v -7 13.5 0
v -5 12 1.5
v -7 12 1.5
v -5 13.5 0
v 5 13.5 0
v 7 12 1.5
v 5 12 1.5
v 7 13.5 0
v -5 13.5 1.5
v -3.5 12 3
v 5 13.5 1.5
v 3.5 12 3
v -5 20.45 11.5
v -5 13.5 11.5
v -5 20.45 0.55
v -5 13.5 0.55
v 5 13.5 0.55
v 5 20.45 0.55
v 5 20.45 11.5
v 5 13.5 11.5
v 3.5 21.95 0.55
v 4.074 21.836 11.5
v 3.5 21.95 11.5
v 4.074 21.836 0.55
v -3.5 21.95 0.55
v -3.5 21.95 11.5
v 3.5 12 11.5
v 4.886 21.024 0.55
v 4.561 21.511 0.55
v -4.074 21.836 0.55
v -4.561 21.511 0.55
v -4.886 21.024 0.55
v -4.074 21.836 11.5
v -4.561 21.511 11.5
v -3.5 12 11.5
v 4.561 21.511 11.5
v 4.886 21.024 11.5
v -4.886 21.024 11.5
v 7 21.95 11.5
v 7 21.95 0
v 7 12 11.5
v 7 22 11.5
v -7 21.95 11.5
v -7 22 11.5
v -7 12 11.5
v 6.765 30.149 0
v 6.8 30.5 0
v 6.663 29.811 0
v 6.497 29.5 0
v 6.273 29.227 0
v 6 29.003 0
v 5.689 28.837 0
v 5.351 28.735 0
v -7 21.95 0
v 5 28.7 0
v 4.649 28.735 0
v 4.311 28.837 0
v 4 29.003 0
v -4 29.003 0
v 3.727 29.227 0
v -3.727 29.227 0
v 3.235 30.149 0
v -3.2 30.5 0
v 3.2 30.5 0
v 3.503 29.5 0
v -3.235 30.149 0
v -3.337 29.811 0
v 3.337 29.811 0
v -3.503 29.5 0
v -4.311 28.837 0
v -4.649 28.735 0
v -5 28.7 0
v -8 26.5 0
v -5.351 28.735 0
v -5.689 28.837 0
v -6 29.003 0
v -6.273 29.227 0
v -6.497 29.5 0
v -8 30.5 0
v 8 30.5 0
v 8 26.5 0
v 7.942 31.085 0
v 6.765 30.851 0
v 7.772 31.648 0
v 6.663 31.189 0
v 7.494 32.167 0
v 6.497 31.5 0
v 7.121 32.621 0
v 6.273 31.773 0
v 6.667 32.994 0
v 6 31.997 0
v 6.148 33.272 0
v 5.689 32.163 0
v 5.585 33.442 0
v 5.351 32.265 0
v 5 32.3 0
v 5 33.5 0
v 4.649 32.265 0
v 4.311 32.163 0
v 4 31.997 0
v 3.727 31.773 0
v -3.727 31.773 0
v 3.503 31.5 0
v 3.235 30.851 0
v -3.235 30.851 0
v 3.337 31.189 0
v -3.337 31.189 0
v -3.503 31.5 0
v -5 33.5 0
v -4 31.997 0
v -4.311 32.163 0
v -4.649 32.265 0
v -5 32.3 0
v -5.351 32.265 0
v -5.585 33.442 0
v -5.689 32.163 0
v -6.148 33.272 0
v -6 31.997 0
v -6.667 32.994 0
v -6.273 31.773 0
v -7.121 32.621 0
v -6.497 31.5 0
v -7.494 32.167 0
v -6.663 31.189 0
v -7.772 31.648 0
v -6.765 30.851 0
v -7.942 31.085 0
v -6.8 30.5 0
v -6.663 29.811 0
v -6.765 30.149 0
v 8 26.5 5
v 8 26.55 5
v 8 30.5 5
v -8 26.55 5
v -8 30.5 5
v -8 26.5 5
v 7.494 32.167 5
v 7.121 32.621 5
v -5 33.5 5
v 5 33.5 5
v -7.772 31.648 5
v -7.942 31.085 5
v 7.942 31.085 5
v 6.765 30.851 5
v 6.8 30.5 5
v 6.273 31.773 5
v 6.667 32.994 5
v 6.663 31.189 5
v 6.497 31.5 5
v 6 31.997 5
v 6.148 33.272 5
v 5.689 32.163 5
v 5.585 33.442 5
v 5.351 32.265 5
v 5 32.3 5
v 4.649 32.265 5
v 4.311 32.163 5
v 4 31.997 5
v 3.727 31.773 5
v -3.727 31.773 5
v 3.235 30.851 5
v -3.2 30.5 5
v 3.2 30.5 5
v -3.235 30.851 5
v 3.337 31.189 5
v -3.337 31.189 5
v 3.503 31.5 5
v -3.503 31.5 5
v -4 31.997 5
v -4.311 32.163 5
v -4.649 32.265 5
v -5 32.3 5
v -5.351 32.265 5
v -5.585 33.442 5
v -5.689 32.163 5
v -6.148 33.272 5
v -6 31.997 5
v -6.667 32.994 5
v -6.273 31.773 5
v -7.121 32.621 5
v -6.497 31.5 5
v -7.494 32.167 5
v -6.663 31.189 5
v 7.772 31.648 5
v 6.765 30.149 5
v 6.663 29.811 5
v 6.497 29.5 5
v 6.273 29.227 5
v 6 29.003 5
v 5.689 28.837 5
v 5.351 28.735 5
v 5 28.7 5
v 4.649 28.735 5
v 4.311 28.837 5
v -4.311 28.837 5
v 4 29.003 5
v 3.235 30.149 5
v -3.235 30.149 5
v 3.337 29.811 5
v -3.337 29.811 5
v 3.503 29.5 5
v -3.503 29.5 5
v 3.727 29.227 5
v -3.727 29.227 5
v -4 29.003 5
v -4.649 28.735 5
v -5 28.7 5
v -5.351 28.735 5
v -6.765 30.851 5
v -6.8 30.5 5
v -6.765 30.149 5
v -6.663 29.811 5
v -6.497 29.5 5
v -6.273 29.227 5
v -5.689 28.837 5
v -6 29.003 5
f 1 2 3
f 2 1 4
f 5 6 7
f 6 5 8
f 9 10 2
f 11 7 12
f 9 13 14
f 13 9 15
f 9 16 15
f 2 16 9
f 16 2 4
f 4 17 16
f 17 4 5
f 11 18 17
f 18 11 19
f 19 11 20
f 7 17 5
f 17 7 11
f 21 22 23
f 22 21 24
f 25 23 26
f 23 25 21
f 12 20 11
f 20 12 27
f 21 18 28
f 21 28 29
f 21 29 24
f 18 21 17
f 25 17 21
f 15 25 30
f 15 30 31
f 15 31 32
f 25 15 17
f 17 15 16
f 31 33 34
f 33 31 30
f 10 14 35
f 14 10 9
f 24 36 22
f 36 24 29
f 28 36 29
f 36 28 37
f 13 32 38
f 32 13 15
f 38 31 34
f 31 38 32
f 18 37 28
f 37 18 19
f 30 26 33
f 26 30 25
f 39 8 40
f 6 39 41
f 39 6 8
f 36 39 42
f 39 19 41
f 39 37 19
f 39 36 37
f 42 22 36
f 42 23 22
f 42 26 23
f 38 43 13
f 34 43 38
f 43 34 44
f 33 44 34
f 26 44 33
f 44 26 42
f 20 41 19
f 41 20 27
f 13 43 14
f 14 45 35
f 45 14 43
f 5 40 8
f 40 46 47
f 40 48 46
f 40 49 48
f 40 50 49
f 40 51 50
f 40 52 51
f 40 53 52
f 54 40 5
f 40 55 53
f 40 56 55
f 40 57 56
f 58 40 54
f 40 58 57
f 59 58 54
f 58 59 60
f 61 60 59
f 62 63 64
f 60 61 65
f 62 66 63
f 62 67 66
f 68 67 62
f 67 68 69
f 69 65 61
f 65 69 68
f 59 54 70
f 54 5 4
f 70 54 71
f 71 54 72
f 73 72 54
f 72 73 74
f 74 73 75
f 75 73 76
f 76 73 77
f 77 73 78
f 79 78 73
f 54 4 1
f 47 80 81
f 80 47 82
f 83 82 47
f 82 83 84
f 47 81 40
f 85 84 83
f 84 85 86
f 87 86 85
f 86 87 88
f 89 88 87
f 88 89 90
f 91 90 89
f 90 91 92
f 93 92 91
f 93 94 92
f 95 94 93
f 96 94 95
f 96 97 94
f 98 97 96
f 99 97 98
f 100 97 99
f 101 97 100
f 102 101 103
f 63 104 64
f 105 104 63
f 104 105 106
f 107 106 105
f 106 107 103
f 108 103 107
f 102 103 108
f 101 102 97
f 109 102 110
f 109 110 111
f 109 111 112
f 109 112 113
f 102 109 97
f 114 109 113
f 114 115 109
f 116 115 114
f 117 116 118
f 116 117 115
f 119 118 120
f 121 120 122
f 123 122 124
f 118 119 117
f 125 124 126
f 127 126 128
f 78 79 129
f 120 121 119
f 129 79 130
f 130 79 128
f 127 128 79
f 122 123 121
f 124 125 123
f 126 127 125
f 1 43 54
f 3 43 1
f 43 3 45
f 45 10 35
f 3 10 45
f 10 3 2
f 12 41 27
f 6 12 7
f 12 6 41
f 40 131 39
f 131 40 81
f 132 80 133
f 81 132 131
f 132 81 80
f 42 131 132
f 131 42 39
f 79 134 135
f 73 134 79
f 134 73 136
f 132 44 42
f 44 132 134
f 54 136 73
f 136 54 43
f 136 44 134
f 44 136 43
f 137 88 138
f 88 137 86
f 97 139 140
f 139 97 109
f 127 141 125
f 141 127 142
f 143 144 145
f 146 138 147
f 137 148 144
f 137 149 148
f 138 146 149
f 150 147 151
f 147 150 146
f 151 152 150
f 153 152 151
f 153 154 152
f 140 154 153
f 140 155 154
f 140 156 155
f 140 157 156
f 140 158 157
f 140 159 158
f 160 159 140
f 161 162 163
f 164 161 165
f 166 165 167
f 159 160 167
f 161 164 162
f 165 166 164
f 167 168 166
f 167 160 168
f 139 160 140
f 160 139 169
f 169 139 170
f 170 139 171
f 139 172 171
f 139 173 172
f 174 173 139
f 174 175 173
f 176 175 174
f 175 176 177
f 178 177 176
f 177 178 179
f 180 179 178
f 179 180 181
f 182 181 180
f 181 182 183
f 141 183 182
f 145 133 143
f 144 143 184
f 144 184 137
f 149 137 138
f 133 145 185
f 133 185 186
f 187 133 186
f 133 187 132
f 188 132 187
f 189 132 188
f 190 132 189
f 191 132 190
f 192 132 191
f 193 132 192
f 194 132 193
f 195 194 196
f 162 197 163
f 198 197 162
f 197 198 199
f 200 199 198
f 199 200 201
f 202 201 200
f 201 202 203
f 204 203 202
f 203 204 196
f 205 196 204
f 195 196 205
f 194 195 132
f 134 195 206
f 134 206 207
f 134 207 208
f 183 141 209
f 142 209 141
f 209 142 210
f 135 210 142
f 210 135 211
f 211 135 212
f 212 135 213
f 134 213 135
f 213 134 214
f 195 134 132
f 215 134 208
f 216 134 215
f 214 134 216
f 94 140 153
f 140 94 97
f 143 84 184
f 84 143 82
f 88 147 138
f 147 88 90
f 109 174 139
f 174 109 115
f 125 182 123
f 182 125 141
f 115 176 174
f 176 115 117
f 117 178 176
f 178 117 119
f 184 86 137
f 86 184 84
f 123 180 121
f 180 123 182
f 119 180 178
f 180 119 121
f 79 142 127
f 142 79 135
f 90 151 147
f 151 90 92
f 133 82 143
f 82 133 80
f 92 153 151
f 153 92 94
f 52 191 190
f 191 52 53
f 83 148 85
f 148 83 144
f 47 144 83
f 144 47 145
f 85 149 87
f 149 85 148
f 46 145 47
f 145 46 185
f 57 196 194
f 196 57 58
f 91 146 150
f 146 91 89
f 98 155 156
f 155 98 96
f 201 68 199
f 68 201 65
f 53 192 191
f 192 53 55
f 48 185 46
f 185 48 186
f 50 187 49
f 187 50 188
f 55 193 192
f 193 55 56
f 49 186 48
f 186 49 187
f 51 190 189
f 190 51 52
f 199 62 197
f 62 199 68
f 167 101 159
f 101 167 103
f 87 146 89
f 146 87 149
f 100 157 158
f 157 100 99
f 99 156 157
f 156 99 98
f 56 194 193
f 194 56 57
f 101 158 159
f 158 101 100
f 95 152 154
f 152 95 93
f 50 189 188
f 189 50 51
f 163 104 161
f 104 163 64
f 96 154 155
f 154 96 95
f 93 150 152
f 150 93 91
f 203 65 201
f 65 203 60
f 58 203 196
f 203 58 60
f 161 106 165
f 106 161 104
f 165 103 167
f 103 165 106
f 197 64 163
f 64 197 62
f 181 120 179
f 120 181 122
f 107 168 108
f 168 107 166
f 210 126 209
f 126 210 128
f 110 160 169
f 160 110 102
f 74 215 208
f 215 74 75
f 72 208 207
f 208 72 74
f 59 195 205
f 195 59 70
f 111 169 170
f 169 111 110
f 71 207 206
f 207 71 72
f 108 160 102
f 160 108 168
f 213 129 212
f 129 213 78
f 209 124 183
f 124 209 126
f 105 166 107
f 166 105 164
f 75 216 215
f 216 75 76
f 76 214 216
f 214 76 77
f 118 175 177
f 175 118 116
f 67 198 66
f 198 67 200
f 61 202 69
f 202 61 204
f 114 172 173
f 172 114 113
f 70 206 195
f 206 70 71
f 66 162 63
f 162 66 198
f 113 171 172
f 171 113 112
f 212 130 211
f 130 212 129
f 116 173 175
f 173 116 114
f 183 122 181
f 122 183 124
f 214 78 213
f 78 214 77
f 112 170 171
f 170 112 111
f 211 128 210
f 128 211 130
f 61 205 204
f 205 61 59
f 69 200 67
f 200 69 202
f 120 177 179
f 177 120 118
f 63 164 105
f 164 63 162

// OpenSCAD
// file: microscope_parameters.scad
/******************************************************************
*                                                                 *
* OpenFlexure Microscope: Microscope Parameters                   *
*                                                                 *
* This is the top-level configuration file for the OpenFlexure    *
* microscope, an open microscope and 3-axis translation stage.    *
* It gets really good precision over a ~10mm range, by using      *
* plastic flexure mechanisms.                                     *
*                                                                 *
* Generally I've tried to put parts (or collections of closely    *
* related parts) in their own files.  However, all the parts      *
* depend on the geometry of the microscope - so these parameters  *
* are gathered together here.  In general, the ones you might     *
* to change are towards the top!  Lower-down ones are defined in  *
* terms of higher-up ones - confusion might arise if you redefine *
* these later...                                                  *
*                                                                 *
* (c) Richard Bowman, January 2016                                *
* Released under the CERN Open Hardware License                   *
*                                                                 *
* http://www.github.com/rwb27/openflexure_microscope              *
* http://www.docubricks.com/projects/openflexure-microscope       *
* http://www.waterscope.org                                       *
*                                                                 *
******************************************************************/

d = 0.05;
$fn=32;

// These are the most useful parameters to change!
big_stage = true;
motor_lugs = true;
version_numstring = "5.15.2";

// This sets the basic geometry of the microscope
sample_z = big_stage?65:40; // height of the top of the stage
leg_r = big_stage?30:25; // radius of innermost part of legs
hole_r = big_stage?15:10; // size of hole in the stage
xy_lever_ratio = big_stage?4.0/7.0:1.0; // mechanical advantage of actuator over stage - can be used to trade speed and precision
z_lever_ratio = big_stage?2.4:2.6; // as above, for Z axis (must be >1)
// The variables below affect the position of the objective mount
z_strut_l = big_stage?20:15; //length of struts supporting Z carriage
objective_clip_y = big_stage?12:6; // y position of clip for optics
objective_clip_w = 10; // width of the dovetail clip for the optics
foot_height = 15; //height of the feet (distance from bottom of body to table)

// These variables set the dimensions of flexures
// You might want to tweak them if your material (or printer)
// is different from the ones I've tested, though ABS/PLA extrusion
// is generally fine with my parameters
stage_flex_w = 4; // width of XY axis flexures
zflex_l = 1.5;    // length of (all) flexible bits
zflex_t = 0.75;   // thickness of (all) flexible bits

// Compile a sensible version string
version_string = str("v",version_numstring, big_stage?str("-LS",sample_z):"", motor_lugs?"-M":"");
echo("Compiling OpenFlexure Microscope ",version_string);

stage_t=5; //thickness of the XY stage (at thickest point, most is 1mm less)
flex_z1 = 0;      // z position of lower flexures for XY axis
flex_z2 = sample_z-stage_t; //height of upper XY flexures
z_strut_t = 6;  // (z) thickness of struts for Z axis
z_flex_w = 4;   // width of struts for Z axis
leg = [4,stage_flex_w,flex_z2+zflex_t]; // size of vertical legs
leg_middle_w = 12; // width of the middle part of each leg

leg_outer_w = leg_middle_w + 2*zflex_l + 2*leg[0]; // overall width of parallelogram legs that support the stagef
actuator = [6,(flex_z2 - flex_z1)*xy_lever_ratio,6]; // dimensions of the core part of the actuating levers for X and Y
actuating_nut_r = (flex_z2 - flex_z1)*xy_lever_ratio; // distance from leg_r to the actuating nut/screw for the XY axes
xy_actuator_travel = actuating_nut_r*0.15; // distance moved by XY axis actuators
z_flexure_x = (leg_r-zflex_l-max(5,leg[2]*0.1))*sqrt(2); // x position of the outside of the Z-axis static anchors (either side of the XY stage, on the X axis)
z_flexure_spacing = min(flex_z2-actuator[2]-z_strut_l*0.22-2, 30); // distance between the two sets of flexures on the Z axis
z_carriage = [(z_flexure_x-zflex_l*2-z_strut_l)+d,4,z_flexure_spacing+zflex_t]; //size of the moving block for the Z carriage
z_nut_y = (z_strut_l+zflex_l)*z_lever_ratio+zflex_l/2; // position of Z actuator
z_actuator_travel = z_nut_y*0.15; // distance moved by the Z actuator
z_carriage_y = z_strut_l+2*zflex_l; // y position of moving pivot on Z axis
z_link_w = 4; // width of linking bar between top Z-axis flexure struts
bridge_dz = 10; // spacing between thin links on legs
base_t=1; // thickness of the flat base of the structure
wall_h=15; // height of the stiffening vertical(ish) walls
wall_t=2; //thickness of the stiffening walls
zawall_h = z_flexure_spacing - 5; //height of wall near Z anchor
zbwall_h = z_actuator_travel+z_strut_t+1+2; //height of bridge over Z lever
illumination_clip_y = (-(leg_r-zflex_l-wall_t/2+leg_outer_w/2)/sqrt(2)
                       -wall_t/2-1); //position of clip for
                      // illumination/back foot.  This is set to
                      // coincide with the wall between the back
                      // two legs.
// main file
include <microscope_parameters.scad>;
use <dovetail.scad>;
use <utilities.scad>;

clip_outer_w = objective_clip_w + 4;
h = 11.5;

//Centre of mounting holes to centre of mounting holes on static part is
// stage[1]/2 + z_lever + zflex[1]+4 (in the +y direction)
// stage[1] = 20
// z_lever = 10
// zflex[1] = 1.5
// so dy = 10 + 10 + 1.5 + 4 = 25.5
// actually the mounting holes are +/-5mm from this (10mm centres) so add 5mm
dy = 25.5 + 5;

difference(){
    union(){
        translate([0,objective_clip_y,0]) dovetail_clip([clip_outer_w,10,h],solid_bottom=0.5,slope_front=1.5);
        sequential_hull(){
            translate([-7,objective_clip_y - d + 10, 0]) cube([14, d, h]);
            translate([-8,dy-4,0]) cube([16,d,5]);
            reflect([1,0,0]) translate([5,dy,0]) cylinder(r=3,h=5);
        }
    }
    
    reflect([1,0,0]) translate([5,dy,0])
            cylinder(d=3*1.2, h=999,center=true);
}
